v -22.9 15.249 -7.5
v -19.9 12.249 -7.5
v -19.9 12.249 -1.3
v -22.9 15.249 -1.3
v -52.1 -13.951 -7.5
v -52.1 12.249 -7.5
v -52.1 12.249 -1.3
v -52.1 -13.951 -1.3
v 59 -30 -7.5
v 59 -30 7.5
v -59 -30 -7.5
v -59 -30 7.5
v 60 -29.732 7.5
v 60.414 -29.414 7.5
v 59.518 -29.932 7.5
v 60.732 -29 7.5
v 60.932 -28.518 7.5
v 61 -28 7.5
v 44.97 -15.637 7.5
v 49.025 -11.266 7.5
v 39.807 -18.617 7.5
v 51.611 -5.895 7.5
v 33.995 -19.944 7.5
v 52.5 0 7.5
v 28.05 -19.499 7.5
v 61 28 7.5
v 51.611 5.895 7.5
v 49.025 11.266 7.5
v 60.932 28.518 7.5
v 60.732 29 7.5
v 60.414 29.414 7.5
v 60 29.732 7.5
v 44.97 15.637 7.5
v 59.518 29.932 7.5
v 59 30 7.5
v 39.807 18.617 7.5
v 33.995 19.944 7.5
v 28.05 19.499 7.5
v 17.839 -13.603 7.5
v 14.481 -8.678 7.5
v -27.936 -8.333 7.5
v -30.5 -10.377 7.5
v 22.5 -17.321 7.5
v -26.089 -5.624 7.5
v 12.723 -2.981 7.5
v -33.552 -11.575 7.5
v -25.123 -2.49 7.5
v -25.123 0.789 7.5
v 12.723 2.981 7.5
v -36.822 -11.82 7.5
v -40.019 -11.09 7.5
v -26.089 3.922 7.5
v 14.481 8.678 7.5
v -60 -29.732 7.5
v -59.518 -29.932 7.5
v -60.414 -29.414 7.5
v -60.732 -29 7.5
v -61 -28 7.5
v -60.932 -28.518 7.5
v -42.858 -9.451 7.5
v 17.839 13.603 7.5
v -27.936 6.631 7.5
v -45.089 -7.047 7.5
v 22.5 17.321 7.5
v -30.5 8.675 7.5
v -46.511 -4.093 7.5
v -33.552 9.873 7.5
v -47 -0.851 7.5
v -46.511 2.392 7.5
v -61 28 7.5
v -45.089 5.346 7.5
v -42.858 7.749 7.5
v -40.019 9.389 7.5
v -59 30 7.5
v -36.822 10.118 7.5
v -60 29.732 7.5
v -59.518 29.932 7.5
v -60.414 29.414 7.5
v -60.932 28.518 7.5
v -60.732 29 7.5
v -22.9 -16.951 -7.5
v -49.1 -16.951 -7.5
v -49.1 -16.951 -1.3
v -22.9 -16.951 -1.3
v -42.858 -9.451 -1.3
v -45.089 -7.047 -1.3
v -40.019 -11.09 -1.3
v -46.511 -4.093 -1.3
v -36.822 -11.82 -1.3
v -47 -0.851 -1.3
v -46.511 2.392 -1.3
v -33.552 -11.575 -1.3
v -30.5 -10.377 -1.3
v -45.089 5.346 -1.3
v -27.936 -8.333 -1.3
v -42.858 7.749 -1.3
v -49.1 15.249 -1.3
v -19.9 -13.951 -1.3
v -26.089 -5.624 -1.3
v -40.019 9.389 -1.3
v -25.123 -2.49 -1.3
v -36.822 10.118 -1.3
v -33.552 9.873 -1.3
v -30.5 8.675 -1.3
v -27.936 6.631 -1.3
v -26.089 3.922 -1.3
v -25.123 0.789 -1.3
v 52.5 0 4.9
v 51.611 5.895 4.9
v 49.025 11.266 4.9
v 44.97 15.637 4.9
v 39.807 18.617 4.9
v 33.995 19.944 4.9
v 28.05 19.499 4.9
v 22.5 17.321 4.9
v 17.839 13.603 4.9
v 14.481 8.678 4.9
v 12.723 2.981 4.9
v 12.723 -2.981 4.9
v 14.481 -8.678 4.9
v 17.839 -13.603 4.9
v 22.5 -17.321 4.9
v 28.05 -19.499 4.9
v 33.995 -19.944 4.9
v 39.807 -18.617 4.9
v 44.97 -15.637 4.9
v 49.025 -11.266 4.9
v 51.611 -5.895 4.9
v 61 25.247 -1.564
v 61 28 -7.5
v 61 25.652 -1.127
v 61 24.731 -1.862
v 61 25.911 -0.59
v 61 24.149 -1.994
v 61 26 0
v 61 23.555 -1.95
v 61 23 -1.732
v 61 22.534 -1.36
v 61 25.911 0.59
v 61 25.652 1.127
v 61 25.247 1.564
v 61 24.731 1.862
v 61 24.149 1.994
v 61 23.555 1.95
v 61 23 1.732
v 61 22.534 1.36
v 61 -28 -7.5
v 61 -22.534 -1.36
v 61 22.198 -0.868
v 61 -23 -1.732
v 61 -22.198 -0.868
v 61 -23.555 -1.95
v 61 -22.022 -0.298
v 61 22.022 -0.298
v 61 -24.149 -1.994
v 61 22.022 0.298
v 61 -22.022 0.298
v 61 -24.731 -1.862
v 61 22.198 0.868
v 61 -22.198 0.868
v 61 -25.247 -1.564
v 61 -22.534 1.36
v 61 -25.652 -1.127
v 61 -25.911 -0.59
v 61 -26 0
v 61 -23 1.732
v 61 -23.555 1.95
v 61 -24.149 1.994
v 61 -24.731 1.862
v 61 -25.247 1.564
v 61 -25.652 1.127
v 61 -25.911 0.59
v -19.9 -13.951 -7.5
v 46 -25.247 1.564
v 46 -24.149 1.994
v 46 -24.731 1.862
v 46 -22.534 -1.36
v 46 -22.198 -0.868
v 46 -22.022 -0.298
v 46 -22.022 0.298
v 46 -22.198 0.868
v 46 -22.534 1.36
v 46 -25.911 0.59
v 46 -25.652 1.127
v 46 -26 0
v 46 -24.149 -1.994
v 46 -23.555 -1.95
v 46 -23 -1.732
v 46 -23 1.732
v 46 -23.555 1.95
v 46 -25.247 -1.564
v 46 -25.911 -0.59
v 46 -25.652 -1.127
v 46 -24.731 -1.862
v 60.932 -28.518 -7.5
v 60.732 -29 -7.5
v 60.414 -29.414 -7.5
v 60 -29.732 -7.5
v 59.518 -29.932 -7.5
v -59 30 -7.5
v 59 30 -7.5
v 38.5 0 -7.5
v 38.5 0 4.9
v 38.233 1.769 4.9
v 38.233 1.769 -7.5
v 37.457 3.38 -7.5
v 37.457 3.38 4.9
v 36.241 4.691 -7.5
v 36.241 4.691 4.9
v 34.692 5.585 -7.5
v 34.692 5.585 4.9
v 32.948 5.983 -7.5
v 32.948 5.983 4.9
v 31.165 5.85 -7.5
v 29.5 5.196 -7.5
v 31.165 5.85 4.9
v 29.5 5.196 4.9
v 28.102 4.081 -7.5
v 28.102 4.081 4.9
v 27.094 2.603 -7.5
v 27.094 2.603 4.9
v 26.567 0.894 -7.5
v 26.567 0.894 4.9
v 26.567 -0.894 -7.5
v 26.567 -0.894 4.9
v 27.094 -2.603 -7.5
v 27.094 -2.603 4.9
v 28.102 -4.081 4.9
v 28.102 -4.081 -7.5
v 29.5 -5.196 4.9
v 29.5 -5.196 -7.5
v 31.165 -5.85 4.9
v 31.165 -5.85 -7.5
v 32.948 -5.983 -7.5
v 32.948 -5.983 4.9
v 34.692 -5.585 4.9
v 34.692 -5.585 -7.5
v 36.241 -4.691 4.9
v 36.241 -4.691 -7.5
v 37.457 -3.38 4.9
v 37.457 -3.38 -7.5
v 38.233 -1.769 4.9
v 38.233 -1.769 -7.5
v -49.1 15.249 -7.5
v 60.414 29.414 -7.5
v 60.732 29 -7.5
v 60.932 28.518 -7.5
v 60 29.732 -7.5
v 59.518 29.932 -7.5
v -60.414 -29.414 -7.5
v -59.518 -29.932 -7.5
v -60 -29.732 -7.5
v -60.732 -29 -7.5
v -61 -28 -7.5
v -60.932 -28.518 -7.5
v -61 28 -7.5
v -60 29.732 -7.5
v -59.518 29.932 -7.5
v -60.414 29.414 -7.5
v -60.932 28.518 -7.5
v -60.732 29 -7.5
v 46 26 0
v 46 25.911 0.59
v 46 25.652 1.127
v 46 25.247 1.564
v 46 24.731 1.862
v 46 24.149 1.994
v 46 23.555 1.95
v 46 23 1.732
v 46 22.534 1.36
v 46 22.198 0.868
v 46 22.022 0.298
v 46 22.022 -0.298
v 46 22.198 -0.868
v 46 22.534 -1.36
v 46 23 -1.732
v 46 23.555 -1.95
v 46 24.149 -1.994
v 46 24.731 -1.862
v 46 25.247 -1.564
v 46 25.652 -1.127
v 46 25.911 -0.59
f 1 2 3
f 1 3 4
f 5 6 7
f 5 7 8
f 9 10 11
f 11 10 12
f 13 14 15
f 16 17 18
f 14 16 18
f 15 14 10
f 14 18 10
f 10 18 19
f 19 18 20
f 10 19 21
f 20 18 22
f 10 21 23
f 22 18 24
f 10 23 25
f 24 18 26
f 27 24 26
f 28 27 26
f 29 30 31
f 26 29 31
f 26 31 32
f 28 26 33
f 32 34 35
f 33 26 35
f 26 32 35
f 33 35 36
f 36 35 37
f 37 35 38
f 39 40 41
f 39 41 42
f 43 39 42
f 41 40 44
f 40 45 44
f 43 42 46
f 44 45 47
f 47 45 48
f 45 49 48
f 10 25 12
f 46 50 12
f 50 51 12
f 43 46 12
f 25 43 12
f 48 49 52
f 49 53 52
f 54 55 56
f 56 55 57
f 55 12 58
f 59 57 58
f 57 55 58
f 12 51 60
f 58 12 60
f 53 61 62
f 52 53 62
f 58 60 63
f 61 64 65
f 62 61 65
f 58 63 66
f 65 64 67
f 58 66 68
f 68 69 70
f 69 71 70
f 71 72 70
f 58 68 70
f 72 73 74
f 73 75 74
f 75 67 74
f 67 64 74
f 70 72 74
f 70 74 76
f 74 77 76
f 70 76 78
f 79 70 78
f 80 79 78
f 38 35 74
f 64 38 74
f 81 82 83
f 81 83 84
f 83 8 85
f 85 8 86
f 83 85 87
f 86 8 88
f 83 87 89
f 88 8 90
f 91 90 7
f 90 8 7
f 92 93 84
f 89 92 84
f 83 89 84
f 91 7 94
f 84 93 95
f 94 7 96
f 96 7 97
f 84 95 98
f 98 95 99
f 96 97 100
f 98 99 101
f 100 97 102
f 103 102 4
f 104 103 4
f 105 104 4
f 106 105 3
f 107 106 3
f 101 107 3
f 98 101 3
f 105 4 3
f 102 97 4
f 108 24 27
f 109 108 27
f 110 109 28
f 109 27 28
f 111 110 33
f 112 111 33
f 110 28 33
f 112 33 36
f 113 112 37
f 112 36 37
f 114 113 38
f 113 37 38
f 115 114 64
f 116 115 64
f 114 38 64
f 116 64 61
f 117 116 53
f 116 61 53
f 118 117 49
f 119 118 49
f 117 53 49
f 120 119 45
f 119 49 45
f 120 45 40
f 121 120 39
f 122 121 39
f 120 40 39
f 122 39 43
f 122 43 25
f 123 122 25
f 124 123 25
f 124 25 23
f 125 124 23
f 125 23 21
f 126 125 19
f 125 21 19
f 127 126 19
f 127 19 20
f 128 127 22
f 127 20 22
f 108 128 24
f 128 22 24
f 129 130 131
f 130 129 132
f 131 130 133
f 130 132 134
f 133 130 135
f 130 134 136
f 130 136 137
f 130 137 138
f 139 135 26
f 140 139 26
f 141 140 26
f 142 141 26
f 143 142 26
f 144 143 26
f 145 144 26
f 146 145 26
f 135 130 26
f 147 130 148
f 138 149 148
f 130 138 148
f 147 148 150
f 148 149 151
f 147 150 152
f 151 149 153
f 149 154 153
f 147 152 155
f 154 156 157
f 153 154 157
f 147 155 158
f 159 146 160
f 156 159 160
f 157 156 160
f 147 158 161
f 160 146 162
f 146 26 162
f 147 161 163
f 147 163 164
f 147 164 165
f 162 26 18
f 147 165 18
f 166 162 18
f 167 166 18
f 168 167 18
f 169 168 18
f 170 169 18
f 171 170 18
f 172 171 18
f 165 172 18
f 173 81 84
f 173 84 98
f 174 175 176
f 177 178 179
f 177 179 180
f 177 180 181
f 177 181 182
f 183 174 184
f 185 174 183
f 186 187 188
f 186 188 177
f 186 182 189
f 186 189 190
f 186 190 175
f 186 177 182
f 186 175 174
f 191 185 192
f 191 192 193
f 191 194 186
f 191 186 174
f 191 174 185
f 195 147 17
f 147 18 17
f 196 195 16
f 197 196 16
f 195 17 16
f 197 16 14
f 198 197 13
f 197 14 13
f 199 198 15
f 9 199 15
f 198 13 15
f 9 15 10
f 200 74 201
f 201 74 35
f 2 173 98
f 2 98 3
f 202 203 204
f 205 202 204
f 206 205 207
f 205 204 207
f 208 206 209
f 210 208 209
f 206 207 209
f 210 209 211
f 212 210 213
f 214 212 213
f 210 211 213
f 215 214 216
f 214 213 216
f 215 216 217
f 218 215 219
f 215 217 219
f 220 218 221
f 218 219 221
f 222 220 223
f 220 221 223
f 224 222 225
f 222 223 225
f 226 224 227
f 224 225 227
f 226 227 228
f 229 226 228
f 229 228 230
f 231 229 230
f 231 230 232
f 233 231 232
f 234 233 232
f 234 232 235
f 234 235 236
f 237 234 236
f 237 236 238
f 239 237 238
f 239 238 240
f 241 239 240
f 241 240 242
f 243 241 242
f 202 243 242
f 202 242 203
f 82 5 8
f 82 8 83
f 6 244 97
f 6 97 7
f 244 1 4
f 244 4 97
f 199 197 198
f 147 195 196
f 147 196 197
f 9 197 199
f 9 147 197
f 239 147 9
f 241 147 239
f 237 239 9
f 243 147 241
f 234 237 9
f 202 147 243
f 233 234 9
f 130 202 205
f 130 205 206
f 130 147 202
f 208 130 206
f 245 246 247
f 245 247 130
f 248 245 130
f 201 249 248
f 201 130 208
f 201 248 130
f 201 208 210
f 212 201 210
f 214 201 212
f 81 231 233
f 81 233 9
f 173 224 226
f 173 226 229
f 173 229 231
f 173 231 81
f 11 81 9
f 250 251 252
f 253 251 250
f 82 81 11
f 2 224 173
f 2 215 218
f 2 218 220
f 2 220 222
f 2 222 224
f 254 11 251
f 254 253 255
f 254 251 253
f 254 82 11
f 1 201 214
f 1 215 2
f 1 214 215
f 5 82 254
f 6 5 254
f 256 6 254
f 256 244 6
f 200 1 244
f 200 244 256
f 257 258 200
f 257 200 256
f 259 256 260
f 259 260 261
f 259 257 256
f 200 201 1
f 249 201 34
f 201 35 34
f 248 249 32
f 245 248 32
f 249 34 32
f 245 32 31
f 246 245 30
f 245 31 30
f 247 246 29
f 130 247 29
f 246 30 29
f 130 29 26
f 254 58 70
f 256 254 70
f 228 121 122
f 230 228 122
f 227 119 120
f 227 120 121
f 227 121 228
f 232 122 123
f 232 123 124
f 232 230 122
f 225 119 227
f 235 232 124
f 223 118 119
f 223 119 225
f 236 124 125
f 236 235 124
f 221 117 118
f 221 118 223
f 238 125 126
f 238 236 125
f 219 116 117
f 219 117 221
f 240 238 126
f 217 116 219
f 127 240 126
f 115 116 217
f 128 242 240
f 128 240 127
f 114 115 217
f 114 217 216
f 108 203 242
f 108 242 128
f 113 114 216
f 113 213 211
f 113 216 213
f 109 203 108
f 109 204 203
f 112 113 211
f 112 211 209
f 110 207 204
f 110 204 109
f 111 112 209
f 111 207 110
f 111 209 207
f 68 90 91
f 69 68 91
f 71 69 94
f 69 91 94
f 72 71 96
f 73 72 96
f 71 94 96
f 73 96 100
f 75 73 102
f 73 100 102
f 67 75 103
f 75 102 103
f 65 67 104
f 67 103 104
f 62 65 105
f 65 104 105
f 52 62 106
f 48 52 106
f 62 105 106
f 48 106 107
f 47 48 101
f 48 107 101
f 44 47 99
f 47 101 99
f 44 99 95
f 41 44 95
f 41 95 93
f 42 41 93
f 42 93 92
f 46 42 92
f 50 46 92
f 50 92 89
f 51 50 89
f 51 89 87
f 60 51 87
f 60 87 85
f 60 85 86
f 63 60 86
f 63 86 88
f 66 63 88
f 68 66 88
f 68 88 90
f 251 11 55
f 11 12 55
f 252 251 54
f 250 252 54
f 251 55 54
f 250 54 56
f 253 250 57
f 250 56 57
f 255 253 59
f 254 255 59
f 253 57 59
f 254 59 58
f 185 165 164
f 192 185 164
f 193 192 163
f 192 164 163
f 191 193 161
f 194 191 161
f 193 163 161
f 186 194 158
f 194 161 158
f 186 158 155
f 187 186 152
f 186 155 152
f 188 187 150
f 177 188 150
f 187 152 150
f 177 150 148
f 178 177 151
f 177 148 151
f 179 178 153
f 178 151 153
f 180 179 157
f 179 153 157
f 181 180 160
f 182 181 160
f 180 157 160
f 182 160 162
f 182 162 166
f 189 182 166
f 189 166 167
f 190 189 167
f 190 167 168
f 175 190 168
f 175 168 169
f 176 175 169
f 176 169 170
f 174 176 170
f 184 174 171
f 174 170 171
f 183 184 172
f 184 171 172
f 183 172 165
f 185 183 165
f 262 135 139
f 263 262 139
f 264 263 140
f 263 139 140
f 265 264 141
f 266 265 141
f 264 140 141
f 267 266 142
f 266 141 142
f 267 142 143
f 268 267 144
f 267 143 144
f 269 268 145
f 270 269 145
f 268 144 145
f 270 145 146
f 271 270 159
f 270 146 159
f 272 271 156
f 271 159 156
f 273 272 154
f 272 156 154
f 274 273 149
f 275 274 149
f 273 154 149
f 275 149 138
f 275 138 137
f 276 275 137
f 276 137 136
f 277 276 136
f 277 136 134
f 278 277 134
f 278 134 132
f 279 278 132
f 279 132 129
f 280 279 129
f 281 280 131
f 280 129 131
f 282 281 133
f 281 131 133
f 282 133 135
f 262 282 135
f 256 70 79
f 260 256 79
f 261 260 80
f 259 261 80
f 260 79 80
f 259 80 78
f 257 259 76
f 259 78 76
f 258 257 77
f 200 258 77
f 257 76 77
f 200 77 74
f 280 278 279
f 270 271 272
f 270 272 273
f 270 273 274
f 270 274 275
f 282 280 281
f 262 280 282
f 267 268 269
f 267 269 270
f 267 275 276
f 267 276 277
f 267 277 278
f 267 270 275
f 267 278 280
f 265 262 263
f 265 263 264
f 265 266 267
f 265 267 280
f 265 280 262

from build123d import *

# Parameters (mm, degrees)
BOSS_EXTRUDE1_DEPTH = 7.5
SKETCH2_R           = 2
CUT_EXTRUDE1_DEPTH  = 15
SKETCH3_R           = 11
CUT_EXTRUDE3_DEPTH  = 35
SKETCH4_R           = 6
CUT_EXTRUDE4_DEPTH  = 19.95
CUT_EXTRUDE5_DEPTH  = 6.2
SKETCH7_R           = 20
CUT_EXTRUDE6_DEPTH  = 2.6


with BuildPart() as part:
    # Sketch1 → Boss-Extrude1 (new, symmetric)
    with BuildSketch(Plane.XY):
        with BuildLine():
            Line((-59, 30), (59, 30))
            ThreePointArc((59, 30), (60.414213562, 29.414213562), (61, 28))
            Line((61, 28), (61, -28))
            ThreePointArc((61, -28), (60.414213562, -29.414213562), (59, -30))
            Line((59, -30), (-59, -30))
            ThreePointArc((-59, -30), (-60.414213562, -29.414213562), (-61, -28))
            Line((-61, -28), (-61, 28))
            ThreePointArc((-61, 28), (-60.414213562, 29.414213562), (-59, 30))
        make_face()
    extrude(amount=BOSS_EXTRUDE1_DEPTH, both=True)

    # Sketch2 → Cut-Extrude1 (cut)
    with BuildSketch(Plane(origin=(61, 0, 0), x_dir=(0, 0, -1), z_dir=(1, 0, 0))):
        with Locations(Location((0, 24, 0), (0, 0, 90))):
            Circle(SKETCH2_R)
        with Locations(Location((0, -24, 0), (0, 0, 270))):
            Circle(SKETCH2_R)
    extrude(amount=-CUT_EXTRUDE1_DEPTH, mode=Mode.SUBTRACT)

    # Sketch3 → Cut-Extrude3 (cut)
    with BuildSketch(Plane(origin=(0, 0, -7.5), x_dir=(-1, 0, 0), z_dir=(0, 0, -1))):
        with Locations((36, -0.850791996)):
            Circle(SKETCH3_R)
    extrude(amount=-CUT_EXTRUDE3_DEPTH, mode=Mode.SUBTRACT)

    # Sketch4 → Cut-Extrude4 (cut)
    with BuildSketch(Plane.XY.offset(7.5)):
        with Locations((32.5, 0)):
            Circle(SKETCH4_R)
    extrude(amount=-CUT_EXTRUDE4_DEPTH, mode=Mode.SUBTRACT)

    # Sketch6 → Cut-Extrude5 (cut)
    with BuildSketch(Plane(origin=(0, 0, -7.5), x_dir=(-1, 0, 0), z_dir=(0, 0, -1))):
        Polygon((49.1, 15.249208004), (52.1, 12.249208004), (52.1, -13.950791996), (49.1, -16.950791996), (22.9, -16.950791996), (19.9, -13.950791996), (19.9, 12.249208004), (22.9, 15.249208004), align=None)
    extrude(amount=-CUT_EXTRUDE5_DEPTH, mode=Mode.SUBTRACT)

    # Sketch7 → Cut-Extrude6 (cut)
    with BuildSketch(Plane.XY.offset(7.5)):
        with Locations((32.5, 0)):
            Circle(SKETCH7_R)
    extrude(amount=-CUT_EXTRUDE6_DEPTH, mode=Mode.SUBTRACT)


solid = part.part
